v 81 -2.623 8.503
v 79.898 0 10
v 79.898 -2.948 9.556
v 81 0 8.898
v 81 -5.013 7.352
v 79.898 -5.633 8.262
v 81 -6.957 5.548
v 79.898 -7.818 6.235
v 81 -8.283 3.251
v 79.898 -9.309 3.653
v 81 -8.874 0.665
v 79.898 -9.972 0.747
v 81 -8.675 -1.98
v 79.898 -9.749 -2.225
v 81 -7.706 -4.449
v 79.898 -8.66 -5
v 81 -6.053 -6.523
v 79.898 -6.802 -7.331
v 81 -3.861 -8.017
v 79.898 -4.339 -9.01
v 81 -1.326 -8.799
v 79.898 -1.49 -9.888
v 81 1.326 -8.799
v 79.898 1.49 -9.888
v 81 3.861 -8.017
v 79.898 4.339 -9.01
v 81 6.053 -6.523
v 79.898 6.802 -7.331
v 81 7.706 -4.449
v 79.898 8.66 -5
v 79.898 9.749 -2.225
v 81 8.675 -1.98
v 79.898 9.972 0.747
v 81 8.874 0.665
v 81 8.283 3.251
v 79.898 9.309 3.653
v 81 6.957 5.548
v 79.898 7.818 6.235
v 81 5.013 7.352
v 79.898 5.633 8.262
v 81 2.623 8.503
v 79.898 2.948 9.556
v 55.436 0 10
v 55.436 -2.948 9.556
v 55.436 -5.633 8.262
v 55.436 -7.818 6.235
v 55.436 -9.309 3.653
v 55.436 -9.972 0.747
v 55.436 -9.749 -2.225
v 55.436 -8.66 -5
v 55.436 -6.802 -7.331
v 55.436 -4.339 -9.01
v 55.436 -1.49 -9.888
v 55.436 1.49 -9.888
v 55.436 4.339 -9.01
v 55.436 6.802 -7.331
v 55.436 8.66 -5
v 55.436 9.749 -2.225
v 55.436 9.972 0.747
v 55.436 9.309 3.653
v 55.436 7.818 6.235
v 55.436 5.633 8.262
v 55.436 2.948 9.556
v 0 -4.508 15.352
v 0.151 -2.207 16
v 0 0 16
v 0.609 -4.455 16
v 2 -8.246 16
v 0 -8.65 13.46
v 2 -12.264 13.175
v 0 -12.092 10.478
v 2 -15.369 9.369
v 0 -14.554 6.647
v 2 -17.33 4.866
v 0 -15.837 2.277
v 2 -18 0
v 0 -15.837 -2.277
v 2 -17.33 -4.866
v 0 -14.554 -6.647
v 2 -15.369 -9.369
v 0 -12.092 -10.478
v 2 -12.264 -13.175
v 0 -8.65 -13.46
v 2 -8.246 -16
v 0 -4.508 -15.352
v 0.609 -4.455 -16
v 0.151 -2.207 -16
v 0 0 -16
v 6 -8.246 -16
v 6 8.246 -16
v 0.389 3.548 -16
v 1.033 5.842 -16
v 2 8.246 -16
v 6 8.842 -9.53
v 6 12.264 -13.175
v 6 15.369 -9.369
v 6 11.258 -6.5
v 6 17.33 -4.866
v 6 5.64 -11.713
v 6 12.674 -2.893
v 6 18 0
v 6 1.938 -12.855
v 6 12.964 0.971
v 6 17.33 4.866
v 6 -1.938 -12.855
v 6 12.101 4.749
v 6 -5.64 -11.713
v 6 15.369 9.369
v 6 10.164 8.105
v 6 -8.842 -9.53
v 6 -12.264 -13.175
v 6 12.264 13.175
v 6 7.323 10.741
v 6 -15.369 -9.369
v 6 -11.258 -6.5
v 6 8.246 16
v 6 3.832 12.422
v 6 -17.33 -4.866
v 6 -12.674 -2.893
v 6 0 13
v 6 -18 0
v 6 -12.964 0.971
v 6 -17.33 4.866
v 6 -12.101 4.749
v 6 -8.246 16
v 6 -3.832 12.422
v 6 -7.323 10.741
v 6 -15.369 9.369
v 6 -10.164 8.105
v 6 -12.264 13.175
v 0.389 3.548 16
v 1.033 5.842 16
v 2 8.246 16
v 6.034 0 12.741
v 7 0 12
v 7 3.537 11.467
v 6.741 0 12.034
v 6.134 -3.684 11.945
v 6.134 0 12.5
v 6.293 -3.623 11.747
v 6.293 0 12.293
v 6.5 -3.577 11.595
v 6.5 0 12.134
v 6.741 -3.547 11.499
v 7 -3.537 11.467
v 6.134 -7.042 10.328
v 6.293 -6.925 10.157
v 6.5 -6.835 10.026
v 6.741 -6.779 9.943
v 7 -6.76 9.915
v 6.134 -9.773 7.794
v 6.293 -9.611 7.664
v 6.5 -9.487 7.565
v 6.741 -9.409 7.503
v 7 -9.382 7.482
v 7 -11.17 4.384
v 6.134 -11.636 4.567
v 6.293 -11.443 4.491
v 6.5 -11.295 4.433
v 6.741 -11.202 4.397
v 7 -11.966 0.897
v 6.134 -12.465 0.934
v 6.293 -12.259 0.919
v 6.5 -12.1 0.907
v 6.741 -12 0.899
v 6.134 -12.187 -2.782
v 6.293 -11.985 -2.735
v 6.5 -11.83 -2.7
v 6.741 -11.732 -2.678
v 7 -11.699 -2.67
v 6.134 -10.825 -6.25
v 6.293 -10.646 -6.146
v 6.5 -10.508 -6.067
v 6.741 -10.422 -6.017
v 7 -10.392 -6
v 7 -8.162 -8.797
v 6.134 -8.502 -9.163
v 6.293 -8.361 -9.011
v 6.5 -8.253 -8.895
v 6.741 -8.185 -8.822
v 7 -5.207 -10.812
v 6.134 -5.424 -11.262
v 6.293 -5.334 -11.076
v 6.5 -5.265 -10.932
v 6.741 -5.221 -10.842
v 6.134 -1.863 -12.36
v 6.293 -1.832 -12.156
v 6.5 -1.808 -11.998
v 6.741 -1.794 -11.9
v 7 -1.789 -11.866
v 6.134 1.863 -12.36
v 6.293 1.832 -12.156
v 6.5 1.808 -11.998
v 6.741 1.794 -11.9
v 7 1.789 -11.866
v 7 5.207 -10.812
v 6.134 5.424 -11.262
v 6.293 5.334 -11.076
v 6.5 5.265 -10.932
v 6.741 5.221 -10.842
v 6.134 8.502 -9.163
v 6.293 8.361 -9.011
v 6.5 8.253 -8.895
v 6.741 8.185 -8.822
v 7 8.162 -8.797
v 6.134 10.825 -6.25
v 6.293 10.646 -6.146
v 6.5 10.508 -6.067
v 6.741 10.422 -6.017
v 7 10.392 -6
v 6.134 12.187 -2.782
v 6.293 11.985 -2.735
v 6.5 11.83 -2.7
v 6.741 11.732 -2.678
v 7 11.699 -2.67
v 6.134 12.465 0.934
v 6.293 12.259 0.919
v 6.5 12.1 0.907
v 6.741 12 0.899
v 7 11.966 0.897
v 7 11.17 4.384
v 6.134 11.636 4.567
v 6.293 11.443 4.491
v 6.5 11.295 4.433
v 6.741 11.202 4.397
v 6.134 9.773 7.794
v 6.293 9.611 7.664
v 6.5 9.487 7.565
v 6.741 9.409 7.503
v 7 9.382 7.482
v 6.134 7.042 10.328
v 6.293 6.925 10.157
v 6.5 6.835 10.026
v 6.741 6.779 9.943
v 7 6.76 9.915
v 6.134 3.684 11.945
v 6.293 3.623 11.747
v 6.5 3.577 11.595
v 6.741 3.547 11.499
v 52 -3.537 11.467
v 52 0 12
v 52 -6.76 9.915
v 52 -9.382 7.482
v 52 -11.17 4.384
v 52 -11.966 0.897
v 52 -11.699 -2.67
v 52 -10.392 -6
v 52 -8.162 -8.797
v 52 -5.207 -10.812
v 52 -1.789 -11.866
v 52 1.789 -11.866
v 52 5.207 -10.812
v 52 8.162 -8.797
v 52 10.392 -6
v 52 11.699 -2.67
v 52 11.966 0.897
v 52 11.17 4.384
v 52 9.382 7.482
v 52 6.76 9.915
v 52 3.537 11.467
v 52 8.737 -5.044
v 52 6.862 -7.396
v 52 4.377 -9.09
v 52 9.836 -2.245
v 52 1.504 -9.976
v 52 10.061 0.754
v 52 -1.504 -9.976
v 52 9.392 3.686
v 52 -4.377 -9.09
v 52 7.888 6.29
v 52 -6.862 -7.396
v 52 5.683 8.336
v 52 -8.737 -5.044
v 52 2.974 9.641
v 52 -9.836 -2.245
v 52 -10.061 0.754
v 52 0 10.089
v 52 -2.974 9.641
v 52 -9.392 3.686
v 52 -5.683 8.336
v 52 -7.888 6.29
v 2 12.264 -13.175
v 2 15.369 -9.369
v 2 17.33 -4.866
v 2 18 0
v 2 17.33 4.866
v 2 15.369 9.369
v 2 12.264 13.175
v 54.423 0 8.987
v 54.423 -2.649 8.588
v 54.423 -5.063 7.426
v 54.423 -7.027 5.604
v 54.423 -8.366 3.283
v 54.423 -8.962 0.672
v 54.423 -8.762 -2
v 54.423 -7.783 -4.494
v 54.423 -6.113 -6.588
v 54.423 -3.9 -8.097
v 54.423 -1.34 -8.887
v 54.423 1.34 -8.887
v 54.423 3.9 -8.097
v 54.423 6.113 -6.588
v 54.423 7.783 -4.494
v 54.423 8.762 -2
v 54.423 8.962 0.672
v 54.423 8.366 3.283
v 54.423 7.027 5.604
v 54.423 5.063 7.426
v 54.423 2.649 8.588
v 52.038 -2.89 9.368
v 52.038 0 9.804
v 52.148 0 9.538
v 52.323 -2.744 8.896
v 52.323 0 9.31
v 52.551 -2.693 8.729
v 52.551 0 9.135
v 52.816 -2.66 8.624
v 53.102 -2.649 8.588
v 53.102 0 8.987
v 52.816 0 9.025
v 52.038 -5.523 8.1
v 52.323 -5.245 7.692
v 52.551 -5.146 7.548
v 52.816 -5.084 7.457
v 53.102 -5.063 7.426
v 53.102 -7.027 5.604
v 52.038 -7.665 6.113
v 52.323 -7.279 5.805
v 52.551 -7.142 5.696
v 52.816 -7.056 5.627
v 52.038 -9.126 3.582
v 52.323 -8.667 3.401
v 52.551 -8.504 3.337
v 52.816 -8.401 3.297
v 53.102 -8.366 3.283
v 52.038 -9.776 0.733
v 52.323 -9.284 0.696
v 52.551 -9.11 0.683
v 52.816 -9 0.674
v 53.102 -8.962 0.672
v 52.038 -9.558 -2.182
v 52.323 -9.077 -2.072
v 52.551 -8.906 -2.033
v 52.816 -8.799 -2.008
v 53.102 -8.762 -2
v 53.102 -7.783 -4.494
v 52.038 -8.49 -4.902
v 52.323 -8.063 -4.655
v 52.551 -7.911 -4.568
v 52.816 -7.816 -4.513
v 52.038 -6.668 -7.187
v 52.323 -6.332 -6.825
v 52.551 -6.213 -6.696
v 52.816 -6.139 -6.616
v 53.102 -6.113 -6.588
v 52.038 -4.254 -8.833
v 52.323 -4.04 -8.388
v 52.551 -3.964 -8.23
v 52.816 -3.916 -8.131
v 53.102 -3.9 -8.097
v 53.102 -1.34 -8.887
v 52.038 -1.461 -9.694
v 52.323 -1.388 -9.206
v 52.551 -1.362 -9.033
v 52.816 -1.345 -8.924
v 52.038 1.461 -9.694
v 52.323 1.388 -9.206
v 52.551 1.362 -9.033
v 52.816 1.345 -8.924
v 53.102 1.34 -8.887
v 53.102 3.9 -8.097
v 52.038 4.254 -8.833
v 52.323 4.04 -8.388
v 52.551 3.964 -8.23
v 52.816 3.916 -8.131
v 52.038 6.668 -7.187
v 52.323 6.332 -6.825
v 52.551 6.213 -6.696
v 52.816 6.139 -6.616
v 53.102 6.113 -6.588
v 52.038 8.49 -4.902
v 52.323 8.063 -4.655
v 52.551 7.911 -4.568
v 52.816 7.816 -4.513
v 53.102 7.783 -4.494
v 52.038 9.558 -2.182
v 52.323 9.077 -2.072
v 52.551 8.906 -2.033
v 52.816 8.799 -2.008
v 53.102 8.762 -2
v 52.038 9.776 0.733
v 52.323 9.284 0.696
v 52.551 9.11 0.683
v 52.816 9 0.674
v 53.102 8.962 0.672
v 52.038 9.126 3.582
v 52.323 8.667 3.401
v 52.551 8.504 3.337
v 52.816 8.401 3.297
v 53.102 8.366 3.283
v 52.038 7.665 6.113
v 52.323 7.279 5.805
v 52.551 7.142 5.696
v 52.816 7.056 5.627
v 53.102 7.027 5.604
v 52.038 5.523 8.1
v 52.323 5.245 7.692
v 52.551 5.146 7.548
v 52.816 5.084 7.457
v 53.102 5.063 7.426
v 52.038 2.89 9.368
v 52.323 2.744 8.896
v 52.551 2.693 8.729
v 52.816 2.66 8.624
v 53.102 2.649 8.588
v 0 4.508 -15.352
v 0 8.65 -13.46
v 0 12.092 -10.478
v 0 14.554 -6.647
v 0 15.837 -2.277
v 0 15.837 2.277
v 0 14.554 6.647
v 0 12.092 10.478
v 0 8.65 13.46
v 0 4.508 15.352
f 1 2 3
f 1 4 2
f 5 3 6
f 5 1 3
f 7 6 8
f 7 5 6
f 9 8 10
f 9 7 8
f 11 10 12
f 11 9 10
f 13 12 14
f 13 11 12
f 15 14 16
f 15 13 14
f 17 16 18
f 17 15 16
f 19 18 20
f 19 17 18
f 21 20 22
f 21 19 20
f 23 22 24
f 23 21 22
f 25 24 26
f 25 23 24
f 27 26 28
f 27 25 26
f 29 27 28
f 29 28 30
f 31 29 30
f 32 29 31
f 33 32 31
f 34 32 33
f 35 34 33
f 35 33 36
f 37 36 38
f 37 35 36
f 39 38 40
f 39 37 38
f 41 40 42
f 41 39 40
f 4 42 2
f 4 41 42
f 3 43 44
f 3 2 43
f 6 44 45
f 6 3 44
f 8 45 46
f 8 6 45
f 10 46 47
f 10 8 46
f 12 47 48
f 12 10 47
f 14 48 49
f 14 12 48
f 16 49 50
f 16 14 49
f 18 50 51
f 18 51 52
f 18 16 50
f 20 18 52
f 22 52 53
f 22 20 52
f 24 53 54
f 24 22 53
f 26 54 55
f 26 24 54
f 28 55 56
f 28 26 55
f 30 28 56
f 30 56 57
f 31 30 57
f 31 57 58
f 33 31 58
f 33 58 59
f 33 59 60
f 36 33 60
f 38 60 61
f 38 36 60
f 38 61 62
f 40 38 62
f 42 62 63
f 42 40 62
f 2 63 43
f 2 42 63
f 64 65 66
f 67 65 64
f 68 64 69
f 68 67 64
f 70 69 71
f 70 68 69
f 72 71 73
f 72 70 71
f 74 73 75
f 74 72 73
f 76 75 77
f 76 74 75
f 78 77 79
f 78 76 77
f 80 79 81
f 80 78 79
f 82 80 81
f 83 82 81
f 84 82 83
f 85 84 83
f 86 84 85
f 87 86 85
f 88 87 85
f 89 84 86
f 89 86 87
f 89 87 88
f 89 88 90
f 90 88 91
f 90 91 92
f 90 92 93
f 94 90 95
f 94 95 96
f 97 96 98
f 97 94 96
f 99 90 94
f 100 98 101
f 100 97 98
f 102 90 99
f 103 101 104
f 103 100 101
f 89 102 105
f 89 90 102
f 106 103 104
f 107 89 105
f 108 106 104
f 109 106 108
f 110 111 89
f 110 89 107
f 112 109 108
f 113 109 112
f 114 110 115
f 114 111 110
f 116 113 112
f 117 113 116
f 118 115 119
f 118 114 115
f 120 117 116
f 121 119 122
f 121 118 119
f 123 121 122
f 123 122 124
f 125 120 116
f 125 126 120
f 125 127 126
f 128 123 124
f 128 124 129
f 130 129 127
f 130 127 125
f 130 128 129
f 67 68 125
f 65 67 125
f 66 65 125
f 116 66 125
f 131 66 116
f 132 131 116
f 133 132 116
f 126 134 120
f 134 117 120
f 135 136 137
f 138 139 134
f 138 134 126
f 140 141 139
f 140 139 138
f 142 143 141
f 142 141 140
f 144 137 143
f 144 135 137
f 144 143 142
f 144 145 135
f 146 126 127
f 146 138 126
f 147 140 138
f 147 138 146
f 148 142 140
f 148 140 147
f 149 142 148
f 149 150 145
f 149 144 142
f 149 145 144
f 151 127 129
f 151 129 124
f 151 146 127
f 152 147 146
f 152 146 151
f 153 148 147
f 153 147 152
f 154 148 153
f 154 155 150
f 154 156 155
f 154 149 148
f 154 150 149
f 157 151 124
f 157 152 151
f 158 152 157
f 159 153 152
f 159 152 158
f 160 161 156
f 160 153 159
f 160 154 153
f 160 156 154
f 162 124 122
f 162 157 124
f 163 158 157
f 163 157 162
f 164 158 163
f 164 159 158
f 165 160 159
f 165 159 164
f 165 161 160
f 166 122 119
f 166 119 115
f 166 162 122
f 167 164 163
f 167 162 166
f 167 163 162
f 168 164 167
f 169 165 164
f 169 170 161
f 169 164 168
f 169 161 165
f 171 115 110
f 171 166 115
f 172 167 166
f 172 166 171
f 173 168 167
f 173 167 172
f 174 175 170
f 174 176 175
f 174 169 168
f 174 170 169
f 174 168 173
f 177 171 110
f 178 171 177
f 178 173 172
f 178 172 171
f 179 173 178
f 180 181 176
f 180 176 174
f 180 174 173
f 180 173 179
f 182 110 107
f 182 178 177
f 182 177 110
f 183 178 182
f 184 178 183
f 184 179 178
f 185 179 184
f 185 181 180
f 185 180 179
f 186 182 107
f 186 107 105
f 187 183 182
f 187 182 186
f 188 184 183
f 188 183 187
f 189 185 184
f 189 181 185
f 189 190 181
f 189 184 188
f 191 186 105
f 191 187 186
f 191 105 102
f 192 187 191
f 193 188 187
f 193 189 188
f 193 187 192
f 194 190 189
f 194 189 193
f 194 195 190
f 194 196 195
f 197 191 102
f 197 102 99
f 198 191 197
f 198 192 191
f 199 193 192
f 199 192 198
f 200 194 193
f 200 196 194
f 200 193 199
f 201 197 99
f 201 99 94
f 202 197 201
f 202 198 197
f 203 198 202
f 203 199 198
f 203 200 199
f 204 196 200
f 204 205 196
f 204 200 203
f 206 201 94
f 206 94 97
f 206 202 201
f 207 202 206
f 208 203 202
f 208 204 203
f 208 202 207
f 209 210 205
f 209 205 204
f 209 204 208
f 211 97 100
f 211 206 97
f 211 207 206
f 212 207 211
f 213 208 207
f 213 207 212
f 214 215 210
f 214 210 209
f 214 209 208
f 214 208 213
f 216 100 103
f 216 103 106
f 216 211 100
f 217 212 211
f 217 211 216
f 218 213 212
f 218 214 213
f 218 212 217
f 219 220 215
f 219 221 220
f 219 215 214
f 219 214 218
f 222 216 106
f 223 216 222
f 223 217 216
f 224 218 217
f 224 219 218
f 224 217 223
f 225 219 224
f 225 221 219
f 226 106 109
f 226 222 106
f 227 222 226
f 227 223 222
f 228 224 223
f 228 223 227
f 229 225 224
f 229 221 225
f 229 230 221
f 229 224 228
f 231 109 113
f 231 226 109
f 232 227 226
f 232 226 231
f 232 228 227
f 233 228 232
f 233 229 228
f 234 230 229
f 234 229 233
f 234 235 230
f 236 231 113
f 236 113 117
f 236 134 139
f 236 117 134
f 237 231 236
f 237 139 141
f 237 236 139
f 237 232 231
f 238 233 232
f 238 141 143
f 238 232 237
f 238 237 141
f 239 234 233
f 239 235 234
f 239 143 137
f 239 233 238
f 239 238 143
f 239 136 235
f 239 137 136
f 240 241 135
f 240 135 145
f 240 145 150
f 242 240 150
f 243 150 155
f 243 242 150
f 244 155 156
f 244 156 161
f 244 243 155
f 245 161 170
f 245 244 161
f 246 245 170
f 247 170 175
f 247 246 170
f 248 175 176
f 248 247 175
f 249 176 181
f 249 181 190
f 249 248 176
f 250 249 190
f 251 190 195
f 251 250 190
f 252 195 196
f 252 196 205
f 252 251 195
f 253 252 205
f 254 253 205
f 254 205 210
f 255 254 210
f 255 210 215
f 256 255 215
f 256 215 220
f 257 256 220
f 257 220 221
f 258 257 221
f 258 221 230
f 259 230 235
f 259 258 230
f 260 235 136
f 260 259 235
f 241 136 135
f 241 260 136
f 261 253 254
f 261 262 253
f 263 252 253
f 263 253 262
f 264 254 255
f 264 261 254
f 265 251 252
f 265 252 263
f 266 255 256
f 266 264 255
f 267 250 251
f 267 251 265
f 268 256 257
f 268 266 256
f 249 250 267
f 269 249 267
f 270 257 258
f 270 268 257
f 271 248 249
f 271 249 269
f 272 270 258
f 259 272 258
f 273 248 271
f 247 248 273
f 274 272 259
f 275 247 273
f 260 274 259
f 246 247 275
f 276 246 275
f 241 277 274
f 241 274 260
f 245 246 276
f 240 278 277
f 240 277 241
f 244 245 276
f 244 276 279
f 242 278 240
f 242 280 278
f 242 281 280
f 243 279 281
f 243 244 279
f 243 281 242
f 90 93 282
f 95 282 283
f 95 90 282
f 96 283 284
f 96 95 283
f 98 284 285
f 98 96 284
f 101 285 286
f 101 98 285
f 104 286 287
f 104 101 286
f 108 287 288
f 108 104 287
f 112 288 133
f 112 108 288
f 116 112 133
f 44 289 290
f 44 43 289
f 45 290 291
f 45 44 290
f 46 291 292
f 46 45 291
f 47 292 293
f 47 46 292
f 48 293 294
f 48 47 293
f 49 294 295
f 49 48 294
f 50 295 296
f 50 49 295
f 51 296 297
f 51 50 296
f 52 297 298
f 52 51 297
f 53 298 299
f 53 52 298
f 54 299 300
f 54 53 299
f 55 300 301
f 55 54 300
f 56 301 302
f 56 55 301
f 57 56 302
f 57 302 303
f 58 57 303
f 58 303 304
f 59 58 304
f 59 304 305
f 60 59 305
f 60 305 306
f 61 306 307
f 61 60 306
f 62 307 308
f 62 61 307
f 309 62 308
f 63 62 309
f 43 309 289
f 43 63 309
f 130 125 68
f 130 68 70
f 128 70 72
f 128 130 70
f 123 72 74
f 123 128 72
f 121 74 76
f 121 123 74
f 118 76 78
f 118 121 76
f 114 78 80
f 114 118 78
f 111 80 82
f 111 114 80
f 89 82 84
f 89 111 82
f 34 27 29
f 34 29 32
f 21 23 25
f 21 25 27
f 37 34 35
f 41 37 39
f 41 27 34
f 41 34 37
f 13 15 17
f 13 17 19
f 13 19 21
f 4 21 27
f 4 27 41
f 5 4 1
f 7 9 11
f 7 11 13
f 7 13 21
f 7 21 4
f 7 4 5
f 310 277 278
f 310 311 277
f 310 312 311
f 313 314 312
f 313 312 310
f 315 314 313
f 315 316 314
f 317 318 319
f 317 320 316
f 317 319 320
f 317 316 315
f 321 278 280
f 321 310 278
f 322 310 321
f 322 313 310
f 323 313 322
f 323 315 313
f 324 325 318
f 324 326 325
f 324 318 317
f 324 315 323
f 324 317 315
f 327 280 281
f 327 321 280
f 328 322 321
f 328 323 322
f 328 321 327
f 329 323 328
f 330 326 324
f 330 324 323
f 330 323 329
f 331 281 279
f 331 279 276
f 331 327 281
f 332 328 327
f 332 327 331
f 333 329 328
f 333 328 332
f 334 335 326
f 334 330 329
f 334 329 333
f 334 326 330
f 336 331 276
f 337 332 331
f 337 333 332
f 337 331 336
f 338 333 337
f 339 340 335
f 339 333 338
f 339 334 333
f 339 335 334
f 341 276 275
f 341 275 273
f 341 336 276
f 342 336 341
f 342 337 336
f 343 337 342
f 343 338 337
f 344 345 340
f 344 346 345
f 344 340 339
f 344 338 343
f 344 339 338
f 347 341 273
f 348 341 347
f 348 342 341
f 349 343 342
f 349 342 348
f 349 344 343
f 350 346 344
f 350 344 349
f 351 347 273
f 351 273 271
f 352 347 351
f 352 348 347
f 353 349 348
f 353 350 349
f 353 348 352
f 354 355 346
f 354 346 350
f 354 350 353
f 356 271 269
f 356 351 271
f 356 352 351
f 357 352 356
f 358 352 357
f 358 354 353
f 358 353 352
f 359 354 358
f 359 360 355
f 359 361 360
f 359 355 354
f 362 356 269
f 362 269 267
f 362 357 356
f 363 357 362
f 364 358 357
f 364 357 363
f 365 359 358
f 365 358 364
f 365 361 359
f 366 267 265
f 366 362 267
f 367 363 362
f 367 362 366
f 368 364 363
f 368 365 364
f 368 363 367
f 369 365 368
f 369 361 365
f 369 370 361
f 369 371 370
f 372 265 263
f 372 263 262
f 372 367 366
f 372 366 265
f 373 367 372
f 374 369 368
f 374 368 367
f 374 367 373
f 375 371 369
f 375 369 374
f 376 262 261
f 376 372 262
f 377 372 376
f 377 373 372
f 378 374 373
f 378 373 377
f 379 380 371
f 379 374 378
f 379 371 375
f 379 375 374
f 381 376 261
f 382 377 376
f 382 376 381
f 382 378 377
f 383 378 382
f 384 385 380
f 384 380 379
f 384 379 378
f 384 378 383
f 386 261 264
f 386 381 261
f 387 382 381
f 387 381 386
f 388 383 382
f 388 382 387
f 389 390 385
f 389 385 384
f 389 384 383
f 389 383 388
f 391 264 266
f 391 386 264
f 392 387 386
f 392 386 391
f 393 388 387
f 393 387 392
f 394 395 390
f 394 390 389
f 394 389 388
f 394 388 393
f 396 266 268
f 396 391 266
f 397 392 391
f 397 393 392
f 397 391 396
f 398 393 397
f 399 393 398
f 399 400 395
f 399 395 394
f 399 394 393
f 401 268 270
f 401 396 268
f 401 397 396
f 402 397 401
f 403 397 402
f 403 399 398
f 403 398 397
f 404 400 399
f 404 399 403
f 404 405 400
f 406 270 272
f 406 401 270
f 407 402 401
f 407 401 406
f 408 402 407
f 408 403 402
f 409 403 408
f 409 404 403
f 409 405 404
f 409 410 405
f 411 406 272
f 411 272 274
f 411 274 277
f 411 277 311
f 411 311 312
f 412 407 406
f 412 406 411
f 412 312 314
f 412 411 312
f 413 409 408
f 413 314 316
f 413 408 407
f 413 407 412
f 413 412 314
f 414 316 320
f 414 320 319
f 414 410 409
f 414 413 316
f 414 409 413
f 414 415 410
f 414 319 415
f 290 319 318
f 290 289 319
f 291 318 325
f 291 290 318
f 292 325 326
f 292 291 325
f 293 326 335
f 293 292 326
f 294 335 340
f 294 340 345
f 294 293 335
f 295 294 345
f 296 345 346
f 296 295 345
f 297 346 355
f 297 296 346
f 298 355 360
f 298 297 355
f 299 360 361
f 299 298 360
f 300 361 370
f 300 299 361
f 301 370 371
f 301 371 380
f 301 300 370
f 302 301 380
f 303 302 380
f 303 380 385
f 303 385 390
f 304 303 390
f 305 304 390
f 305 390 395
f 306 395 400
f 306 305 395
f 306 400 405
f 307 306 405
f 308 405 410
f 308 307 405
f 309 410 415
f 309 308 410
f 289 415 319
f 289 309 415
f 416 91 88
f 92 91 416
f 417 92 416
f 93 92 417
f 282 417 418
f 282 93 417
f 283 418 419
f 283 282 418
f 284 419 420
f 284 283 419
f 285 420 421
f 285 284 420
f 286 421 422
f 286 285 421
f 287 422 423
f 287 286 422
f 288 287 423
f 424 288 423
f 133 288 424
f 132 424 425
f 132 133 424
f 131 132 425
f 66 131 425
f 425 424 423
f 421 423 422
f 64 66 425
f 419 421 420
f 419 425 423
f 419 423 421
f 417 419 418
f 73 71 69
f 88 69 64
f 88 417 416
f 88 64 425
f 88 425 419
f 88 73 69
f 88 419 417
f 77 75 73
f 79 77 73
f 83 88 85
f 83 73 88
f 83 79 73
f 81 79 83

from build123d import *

# Parameters (mm, degrees)
SKETCH1_W          = 2
SKETCH1_H          = 36
CUT_EXTRUDE1_DEPTH = 6
FILLET1_R          = 1


with BuildPart() as part:
    # BodySke → BaseBody (revolve)
    with BuildSketch(Plane.XY, mode=Mode.PRIVATE) as basebody_sk:
        with BuildLine():
            Line((0, 0), (0, 16))
            Line((0, 16), (2, 18))
            Line((2, 18), (6, 18))
            Line((6, 18), (6, 12))
            Line((6, 12), (52, 12))
            Line((52, 12), (52, 10.088985))
            ThreePointArc((52, 10.088985), (52.322621881, 9.310106881), (53.1015, 8.987485))
            Line((53.1015, 8.987485), (54.4233, 8.987485))
            Line((54.4233, 8.987485), (55.435815, 10))
            Line((55.435815, 10), (79.8985, 10))
            Line((79.8985, 10), (81, 8.8985))
            Line((81, 8.8985), (81, 0))
            Line((81, 0), (0, 0))
        make_face()
    revolve(basebody_sk.sketch.rotate(Axis((-6.35, 0, 0), (1, 0, 0)), 90), axis=Axis((-6.35, 0, 0), (1, 0, 0)))

    # Sketch1 → Cut-Extrude1 (cut)
    with BuildSketch(Plane.ZY):
        with Locations((-17, 0)):
            Rectangle(SKETCH1_W, SKETCH1_H)
        with Locations((17, 0)):
            Rectangle(SKETCH1_W, SKETCH1_H)
    extrude(amount=-CUT_EXTRUDE1_DEPTH, mode=Mode.SUBTRACT)

    # Fillet1
    fillet1_edges = [part.edges().sort_by_distance(p)[0] for p in [
        (6, 0, -12),
    ]]
    fillet(fillet1_edges, radius=FILLET1_R)


solid = part.part
